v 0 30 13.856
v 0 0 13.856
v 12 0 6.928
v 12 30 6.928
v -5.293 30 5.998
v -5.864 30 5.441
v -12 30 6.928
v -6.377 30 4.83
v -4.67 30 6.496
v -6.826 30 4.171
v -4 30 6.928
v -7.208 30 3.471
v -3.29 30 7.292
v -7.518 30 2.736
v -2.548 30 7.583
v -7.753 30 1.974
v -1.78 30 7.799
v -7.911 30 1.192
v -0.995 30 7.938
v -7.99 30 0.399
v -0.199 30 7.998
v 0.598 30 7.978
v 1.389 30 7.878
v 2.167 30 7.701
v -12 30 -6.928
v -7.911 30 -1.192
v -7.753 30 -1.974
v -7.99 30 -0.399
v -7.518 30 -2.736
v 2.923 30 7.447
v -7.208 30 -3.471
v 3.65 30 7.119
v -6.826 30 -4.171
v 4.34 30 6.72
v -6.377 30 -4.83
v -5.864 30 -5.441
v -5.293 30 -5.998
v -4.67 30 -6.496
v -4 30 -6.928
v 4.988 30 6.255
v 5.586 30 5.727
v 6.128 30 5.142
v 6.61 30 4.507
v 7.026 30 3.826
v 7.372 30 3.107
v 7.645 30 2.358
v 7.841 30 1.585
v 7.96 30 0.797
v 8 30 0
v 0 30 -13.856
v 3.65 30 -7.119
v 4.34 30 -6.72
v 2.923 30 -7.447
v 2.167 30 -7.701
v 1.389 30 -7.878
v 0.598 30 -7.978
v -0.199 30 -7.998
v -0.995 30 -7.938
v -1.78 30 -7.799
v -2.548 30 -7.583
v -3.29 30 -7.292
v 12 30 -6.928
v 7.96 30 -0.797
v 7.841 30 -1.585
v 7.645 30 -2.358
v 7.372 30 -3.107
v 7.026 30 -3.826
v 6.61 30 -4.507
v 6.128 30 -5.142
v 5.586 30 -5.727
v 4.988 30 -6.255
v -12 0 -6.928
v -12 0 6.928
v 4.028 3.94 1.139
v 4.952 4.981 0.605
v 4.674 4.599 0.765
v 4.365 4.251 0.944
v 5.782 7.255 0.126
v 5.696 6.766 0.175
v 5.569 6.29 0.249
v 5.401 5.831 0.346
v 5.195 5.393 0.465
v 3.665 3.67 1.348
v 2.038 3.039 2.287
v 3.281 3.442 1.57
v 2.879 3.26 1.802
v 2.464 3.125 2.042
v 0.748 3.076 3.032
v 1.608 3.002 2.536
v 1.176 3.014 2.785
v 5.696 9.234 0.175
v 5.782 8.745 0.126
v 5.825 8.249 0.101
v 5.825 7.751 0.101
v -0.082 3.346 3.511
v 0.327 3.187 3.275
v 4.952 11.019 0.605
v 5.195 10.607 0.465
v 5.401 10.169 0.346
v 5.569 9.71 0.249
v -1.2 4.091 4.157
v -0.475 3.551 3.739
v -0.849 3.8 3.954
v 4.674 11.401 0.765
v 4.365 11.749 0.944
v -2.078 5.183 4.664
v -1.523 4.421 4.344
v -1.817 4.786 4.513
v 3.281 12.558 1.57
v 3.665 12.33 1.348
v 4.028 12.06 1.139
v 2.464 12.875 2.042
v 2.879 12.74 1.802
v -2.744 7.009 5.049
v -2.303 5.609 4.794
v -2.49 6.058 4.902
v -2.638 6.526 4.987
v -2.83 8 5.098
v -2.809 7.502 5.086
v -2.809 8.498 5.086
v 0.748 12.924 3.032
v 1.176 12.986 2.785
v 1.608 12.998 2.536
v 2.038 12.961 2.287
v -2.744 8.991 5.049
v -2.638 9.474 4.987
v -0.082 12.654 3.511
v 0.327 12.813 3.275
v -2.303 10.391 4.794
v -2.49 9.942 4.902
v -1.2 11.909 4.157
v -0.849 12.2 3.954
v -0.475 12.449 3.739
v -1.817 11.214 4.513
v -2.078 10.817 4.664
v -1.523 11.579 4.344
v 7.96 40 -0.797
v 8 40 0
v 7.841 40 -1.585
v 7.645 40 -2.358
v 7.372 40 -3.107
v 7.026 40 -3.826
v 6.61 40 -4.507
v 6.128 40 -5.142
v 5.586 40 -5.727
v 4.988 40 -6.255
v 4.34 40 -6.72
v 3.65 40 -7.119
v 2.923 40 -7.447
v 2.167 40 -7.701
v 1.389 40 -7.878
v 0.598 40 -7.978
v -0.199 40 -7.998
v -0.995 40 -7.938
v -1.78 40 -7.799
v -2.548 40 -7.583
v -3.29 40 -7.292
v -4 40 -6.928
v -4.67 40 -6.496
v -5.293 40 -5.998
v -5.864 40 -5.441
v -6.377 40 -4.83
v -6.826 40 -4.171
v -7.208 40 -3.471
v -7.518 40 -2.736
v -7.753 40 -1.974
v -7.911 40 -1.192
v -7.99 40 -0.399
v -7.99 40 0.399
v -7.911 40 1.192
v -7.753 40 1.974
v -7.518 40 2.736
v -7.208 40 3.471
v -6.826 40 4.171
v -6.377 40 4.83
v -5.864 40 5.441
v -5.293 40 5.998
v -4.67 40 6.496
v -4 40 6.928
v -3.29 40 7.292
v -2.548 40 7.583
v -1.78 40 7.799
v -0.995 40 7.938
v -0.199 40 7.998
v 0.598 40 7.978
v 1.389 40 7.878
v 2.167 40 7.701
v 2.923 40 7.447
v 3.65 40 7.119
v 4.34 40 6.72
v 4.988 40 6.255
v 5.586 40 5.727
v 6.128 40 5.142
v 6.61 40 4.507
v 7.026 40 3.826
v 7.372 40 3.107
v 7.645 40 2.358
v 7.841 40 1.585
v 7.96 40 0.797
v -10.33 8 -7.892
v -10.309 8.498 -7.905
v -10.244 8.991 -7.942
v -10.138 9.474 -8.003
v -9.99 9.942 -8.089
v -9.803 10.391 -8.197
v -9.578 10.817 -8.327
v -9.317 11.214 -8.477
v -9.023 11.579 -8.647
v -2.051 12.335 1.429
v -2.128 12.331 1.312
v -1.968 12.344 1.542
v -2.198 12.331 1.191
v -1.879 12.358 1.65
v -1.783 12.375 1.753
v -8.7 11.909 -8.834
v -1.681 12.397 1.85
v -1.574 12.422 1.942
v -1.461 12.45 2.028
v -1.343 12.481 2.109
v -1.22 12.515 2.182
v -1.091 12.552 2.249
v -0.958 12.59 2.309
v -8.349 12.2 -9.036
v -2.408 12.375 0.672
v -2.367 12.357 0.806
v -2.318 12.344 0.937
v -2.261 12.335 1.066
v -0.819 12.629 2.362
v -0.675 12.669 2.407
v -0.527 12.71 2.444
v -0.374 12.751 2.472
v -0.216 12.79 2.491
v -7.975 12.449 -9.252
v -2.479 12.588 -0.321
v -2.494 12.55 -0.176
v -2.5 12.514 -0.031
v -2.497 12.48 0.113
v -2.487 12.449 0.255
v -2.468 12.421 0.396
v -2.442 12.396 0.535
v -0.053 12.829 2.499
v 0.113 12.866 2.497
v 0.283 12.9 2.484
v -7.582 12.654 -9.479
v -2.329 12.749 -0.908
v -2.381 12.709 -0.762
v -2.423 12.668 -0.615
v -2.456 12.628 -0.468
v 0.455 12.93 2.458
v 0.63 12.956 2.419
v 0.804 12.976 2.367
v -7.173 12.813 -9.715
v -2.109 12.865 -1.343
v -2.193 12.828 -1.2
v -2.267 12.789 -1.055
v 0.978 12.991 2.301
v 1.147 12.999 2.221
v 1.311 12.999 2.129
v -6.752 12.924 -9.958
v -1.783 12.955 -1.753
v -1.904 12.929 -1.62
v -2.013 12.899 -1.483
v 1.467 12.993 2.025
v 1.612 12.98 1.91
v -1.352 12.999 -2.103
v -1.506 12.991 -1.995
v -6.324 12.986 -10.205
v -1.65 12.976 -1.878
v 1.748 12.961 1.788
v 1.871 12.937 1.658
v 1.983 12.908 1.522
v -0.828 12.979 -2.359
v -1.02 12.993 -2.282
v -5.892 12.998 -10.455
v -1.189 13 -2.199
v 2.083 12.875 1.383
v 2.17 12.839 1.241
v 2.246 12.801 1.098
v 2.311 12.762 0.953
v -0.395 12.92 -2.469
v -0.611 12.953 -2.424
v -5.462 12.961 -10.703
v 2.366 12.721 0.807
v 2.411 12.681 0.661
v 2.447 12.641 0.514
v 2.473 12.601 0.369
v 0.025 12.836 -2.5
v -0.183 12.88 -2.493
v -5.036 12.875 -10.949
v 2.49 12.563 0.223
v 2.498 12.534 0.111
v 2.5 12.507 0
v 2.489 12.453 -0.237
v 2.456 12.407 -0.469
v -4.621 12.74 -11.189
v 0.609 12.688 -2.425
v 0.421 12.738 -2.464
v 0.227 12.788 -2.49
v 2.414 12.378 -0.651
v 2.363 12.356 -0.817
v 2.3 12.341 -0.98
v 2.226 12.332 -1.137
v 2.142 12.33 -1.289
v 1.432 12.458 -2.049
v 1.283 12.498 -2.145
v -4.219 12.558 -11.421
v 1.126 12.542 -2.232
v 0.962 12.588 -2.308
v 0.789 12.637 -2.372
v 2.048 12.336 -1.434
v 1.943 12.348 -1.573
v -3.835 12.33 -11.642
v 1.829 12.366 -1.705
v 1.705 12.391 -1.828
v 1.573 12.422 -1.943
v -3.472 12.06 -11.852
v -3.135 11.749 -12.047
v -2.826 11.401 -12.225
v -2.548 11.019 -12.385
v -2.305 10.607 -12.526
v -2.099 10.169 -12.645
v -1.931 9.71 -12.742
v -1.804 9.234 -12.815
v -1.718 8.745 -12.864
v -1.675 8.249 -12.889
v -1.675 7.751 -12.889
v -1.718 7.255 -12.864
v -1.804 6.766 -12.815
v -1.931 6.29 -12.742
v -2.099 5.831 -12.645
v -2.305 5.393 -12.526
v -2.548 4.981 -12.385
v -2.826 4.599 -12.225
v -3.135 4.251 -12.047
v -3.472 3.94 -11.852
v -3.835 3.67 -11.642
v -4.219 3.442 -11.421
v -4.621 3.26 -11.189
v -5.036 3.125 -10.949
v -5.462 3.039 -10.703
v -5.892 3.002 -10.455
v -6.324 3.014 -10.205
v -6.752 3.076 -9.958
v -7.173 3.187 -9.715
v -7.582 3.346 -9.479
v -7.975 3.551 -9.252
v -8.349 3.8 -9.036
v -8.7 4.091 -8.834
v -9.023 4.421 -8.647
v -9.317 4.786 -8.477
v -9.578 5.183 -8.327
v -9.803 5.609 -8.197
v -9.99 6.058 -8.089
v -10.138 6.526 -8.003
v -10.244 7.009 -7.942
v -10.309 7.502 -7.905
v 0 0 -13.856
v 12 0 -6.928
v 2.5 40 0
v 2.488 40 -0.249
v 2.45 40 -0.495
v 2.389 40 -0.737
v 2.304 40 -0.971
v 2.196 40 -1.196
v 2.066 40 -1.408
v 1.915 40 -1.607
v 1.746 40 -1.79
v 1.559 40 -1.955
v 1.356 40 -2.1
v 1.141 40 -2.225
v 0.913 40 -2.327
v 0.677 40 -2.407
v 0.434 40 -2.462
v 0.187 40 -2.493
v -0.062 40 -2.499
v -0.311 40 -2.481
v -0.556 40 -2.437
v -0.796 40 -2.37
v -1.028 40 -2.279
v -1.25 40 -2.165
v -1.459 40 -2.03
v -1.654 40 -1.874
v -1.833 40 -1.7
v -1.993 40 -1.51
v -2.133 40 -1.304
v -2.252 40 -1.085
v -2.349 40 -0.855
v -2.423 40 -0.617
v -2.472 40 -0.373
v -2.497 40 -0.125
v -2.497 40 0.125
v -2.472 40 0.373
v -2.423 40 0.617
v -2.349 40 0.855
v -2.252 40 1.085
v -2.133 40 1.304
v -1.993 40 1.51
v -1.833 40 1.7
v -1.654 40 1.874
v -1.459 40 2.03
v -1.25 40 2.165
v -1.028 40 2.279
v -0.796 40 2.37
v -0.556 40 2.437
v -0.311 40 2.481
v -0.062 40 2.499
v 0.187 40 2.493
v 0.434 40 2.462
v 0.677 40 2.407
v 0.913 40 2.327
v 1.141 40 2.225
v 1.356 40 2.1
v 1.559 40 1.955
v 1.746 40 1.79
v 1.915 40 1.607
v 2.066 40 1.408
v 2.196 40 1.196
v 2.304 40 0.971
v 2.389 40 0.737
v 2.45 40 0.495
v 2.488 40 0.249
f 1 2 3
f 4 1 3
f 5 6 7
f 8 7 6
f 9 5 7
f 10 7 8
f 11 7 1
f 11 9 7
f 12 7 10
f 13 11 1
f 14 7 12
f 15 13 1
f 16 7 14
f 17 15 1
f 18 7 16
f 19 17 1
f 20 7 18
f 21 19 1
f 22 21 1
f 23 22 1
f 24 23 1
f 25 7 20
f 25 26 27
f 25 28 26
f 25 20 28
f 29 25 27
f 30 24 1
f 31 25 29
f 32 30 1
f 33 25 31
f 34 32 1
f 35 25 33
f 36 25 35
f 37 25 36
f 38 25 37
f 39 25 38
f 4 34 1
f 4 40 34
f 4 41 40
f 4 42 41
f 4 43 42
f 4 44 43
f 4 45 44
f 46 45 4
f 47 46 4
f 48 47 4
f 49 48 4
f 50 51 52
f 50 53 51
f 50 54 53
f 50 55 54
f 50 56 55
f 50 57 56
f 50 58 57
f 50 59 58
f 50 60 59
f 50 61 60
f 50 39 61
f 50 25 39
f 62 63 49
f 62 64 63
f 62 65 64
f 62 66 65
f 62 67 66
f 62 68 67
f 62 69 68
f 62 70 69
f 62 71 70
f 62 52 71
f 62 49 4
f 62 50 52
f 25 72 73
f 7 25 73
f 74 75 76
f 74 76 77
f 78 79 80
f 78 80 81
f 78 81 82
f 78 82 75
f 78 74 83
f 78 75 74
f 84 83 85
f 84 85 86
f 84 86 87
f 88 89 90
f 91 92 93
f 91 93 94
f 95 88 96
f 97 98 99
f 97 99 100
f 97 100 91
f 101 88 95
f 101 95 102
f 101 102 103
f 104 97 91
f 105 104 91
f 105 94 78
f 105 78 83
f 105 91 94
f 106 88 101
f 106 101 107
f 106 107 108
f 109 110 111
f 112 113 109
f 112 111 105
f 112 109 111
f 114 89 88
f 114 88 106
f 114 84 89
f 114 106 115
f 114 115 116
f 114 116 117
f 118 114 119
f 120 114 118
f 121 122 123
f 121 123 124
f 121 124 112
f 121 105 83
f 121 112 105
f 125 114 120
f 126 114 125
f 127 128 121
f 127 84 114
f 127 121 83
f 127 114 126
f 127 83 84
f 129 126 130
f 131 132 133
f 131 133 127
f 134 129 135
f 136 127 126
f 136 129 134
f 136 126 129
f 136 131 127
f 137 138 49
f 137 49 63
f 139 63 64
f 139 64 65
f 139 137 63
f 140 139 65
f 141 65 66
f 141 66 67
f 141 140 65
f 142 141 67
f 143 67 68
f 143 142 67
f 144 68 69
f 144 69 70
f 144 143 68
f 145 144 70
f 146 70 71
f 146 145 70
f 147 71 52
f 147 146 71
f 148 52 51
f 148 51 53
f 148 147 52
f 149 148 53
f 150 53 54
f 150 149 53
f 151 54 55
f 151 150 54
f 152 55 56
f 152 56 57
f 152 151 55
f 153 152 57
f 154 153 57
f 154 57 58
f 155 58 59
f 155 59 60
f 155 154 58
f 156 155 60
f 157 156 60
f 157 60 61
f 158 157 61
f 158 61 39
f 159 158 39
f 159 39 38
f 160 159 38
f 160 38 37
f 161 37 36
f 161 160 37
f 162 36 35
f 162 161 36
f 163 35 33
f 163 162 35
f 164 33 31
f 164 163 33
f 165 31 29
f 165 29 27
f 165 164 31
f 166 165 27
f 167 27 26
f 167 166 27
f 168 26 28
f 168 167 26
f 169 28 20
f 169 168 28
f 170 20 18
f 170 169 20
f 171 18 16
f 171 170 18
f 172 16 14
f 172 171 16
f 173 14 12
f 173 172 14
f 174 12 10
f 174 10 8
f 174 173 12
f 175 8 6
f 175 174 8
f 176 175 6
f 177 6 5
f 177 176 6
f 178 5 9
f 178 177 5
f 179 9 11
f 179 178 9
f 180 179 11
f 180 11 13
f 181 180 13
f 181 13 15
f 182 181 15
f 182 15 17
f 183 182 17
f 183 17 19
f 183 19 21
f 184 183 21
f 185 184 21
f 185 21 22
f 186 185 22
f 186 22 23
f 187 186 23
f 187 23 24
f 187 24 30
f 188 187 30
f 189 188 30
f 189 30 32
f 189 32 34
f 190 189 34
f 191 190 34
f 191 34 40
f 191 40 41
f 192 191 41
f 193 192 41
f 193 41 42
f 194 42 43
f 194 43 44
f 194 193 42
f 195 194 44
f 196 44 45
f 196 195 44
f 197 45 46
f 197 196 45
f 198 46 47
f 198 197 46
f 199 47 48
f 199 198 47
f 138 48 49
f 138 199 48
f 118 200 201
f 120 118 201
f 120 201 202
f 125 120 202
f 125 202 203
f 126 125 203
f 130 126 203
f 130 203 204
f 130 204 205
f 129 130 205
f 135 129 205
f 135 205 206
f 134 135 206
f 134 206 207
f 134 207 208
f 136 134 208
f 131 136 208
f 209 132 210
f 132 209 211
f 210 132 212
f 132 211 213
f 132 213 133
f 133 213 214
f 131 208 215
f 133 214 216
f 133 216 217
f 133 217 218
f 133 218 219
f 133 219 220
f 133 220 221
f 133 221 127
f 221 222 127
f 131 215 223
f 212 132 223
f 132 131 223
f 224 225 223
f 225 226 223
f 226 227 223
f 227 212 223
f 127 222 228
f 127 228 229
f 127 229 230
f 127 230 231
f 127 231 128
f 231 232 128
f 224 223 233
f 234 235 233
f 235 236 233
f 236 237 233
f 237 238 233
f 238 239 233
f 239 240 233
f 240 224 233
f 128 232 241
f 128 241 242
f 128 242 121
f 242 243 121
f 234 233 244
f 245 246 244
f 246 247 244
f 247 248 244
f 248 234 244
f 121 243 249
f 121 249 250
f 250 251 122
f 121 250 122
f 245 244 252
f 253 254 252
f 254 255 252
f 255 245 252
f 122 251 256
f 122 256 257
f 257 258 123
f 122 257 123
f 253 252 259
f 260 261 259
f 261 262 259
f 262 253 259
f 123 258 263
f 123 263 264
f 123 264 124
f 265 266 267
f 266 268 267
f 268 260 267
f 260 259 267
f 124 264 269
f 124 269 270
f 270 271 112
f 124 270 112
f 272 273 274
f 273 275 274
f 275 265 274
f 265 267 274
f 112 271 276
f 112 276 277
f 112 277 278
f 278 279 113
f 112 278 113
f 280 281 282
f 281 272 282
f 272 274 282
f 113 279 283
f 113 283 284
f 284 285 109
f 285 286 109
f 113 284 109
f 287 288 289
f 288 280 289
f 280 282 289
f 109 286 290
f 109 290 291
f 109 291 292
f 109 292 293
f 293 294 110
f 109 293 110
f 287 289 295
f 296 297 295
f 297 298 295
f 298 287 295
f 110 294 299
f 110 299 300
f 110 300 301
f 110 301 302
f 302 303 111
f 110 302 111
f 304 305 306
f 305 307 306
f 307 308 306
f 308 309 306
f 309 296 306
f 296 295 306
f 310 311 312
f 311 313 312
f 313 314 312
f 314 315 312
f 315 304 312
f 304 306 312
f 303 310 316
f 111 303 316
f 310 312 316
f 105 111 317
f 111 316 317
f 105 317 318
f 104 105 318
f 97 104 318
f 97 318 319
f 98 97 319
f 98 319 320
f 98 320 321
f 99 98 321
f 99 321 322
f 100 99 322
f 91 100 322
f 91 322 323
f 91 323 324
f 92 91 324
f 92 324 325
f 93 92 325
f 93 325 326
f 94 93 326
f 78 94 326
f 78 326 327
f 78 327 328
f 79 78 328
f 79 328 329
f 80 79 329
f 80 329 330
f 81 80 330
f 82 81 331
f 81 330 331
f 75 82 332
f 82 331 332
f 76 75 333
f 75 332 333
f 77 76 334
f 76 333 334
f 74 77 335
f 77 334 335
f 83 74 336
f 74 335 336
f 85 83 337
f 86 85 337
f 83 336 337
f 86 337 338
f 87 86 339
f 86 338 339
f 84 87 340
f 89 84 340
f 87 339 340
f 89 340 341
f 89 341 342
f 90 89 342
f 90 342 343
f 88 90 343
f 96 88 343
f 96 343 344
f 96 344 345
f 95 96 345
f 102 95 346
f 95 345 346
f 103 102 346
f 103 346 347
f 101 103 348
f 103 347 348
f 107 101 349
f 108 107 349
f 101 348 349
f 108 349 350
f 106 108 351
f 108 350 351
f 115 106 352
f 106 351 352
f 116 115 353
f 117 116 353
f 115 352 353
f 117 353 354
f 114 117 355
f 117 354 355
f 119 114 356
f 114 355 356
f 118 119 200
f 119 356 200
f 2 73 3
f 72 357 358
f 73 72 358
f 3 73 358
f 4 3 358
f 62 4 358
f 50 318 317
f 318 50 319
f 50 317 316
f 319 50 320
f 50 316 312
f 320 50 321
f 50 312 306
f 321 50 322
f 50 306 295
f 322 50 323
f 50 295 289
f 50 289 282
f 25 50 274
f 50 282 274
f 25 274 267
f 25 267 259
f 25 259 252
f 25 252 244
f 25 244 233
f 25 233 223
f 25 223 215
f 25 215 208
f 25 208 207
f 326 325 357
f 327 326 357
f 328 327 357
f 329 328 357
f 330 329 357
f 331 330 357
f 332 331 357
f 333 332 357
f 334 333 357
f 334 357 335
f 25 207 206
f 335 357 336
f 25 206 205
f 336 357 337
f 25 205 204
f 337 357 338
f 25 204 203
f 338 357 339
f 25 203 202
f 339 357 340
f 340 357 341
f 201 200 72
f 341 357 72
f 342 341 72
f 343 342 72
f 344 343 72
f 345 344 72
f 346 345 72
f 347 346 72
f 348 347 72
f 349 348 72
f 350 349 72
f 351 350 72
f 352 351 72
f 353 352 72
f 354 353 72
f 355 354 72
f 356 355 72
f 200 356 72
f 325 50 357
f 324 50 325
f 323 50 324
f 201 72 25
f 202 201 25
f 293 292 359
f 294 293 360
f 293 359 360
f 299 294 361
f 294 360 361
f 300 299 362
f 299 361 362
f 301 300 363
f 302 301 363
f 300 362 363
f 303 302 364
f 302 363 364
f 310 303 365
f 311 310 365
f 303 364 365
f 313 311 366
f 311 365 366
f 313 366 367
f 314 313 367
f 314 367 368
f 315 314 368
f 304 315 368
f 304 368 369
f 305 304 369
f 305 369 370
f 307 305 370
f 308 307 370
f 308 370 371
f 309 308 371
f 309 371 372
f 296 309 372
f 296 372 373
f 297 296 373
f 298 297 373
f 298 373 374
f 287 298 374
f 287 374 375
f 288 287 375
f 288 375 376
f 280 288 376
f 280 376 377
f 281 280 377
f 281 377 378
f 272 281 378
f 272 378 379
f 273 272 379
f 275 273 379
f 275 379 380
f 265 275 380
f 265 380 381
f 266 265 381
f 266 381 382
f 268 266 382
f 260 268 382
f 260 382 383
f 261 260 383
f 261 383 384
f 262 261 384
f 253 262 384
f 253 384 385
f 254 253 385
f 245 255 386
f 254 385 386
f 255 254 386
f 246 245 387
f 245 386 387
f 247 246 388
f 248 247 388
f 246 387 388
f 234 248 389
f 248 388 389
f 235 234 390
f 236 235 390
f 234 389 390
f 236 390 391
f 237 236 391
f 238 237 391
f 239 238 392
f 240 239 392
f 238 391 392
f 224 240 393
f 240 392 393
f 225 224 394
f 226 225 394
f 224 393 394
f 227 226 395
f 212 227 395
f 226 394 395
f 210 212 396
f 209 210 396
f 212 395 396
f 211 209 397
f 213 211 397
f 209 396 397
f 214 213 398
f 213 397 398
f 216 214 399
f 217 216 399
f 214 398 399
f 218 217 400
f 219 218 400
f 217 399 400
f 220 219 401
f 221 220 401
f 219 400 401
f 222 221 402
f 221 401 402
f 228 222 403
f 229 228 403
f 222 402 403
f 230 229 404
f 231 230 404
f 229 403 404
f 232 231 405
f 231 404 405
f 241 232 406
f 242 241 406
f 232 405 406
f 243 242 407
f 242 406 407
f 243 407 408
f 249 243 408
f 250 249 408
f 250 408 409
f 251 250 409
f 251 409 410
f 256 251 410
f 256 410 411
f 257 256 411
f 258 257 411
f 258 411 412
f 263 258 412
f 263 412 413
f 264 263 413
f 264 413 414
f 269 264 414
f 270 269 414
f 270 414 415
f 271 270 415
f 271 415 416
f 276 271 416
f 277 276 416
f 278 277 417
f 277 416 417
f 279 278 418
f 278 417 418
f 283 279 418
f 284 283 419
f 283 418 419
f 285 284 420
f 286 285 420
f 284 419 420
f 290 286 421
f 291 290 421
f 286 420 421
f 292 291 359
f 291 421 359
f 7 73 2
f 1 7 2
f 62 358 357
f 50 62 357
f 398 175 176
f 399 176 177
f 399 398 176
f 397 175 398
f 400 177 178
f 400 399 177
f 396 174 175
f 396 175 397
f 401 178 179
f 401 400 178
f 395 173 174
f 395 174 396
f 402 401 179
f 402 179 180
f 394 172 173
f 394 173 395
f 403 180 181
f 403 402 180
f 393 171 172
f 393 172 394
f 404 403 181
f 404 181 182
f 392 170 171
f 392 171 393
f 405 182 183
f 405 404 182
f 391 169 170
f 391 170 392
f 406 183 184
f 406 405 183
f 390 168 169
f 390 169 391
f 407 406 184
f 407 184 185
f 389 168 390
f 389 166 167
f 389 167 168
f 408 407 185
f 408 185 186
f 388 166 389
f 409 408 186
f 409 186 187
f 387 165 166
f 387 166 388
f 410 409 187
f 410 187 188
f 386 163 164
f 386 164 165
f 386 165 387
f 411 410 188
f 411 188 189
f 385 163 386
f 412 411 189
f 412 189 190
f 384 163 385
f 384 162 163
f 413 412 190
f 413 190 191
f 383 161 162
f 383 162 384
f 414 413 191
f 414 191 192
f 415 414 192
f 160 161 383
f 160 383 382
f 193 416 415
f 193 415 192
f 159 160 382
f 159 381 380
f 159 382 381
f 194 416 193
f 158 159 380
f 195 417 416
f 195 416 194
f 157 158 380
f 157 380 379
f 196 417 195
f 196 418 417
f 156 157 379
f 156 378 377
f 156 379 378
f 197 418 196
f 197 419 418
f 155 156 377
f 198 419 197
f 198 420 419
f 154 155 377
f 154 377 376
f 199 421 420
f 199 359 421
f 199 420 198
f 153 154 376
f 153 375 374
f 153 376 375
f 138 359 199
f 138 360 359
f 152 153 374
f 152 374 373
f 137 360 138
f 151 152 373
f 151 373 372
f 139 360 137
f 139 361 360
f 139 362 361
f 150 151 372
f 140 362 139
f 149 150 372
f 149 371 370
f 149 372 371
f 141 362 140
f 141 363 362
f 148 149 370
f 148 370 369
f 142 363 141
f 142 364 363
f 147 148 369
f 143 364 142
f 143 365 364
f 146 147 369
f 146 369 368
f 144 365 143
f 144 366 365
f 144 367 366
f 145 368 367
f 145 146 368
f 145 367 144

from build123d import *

# Parameters (mm, degrees)
EXTRUDE_1_DEPTH     = 40
SKETCH_3_R          = 2.5
CUT_EXTRUDE_2_DEPTH = 35
SKETCH_4_OUTSIDE_W  = 36.852
SKETCH_4_OUTSIDE_H  = 40.564
SKETCH_4_OUTSIDE_R  = 8
CUT_EXTRUDE_3_DEPTH = 10
SKETCH_5_R          = 5
CUT_EXTRUDE_4_DEPTH = 15


with BuildPart() as part:
    # Эскиз1 → Бобышка-Вытянуть1 (new body)
    with BuildSketch(Plane(origin=(0, 0, 0), x_dir=(1, 0, 0), z_dir=(0, 1, 0))):
        Polygon((0, 13.856406461), (-12, 6.92820323), (-12, -6.92820323), (0, -13.856406461), (12, -6.92820323), (12, 6.92820323), align=None)
    extrude(amount=EXTRUDE_1_DEPTH)

    # Эскиз3 → Вырез-Вытянуть2 (cut)
    with BuildSketch(Plane(origin=(0, 40, 0), x_dir=(1, 0, 0), z_dir=(0, 1, 0))):
        Circle(SKETCH_3_R)
    extrude(amount=-CUT_EXTRUDE_2_DEPTH, mode=Mode.SUBTRACT)

    # Эскиз4 outside → Вырез-Вытянуть3 (cut)
    with BuildSketch(Plane(origin=(0, 40, 0), x_dir=(1, 0, 0), z_dir=(0, 1, 0))):
        Rectangle(SKETCH_4_OUTSIDE_W, SKETCH_4_OUTSIDE_H)
        Circle(SKETCH_4_OUTSIDE_R, mode=Mode.SUBTRACT)
    extrude(amount=-CUT_EXTRUDE_3_DEPTH, mode=Mode.SUBTRACT)

    # Эскиз5 → Вырез-Вытянуть4 (cut)
    with BuildSketch(Plane(origin=(-6, 0, -10.392304845), x_dir=(-0.866025404, 0, 0.5), z_dir=(-0.5, 0, -0.866025404))):
        with Locations((0, 8)):
            Circle(SKETCH_5_R)
    extrude(amount=-CUT_EXTRUDE_4_DEPTH, mode=Mode.SUBTRACT)


solid = part.part
